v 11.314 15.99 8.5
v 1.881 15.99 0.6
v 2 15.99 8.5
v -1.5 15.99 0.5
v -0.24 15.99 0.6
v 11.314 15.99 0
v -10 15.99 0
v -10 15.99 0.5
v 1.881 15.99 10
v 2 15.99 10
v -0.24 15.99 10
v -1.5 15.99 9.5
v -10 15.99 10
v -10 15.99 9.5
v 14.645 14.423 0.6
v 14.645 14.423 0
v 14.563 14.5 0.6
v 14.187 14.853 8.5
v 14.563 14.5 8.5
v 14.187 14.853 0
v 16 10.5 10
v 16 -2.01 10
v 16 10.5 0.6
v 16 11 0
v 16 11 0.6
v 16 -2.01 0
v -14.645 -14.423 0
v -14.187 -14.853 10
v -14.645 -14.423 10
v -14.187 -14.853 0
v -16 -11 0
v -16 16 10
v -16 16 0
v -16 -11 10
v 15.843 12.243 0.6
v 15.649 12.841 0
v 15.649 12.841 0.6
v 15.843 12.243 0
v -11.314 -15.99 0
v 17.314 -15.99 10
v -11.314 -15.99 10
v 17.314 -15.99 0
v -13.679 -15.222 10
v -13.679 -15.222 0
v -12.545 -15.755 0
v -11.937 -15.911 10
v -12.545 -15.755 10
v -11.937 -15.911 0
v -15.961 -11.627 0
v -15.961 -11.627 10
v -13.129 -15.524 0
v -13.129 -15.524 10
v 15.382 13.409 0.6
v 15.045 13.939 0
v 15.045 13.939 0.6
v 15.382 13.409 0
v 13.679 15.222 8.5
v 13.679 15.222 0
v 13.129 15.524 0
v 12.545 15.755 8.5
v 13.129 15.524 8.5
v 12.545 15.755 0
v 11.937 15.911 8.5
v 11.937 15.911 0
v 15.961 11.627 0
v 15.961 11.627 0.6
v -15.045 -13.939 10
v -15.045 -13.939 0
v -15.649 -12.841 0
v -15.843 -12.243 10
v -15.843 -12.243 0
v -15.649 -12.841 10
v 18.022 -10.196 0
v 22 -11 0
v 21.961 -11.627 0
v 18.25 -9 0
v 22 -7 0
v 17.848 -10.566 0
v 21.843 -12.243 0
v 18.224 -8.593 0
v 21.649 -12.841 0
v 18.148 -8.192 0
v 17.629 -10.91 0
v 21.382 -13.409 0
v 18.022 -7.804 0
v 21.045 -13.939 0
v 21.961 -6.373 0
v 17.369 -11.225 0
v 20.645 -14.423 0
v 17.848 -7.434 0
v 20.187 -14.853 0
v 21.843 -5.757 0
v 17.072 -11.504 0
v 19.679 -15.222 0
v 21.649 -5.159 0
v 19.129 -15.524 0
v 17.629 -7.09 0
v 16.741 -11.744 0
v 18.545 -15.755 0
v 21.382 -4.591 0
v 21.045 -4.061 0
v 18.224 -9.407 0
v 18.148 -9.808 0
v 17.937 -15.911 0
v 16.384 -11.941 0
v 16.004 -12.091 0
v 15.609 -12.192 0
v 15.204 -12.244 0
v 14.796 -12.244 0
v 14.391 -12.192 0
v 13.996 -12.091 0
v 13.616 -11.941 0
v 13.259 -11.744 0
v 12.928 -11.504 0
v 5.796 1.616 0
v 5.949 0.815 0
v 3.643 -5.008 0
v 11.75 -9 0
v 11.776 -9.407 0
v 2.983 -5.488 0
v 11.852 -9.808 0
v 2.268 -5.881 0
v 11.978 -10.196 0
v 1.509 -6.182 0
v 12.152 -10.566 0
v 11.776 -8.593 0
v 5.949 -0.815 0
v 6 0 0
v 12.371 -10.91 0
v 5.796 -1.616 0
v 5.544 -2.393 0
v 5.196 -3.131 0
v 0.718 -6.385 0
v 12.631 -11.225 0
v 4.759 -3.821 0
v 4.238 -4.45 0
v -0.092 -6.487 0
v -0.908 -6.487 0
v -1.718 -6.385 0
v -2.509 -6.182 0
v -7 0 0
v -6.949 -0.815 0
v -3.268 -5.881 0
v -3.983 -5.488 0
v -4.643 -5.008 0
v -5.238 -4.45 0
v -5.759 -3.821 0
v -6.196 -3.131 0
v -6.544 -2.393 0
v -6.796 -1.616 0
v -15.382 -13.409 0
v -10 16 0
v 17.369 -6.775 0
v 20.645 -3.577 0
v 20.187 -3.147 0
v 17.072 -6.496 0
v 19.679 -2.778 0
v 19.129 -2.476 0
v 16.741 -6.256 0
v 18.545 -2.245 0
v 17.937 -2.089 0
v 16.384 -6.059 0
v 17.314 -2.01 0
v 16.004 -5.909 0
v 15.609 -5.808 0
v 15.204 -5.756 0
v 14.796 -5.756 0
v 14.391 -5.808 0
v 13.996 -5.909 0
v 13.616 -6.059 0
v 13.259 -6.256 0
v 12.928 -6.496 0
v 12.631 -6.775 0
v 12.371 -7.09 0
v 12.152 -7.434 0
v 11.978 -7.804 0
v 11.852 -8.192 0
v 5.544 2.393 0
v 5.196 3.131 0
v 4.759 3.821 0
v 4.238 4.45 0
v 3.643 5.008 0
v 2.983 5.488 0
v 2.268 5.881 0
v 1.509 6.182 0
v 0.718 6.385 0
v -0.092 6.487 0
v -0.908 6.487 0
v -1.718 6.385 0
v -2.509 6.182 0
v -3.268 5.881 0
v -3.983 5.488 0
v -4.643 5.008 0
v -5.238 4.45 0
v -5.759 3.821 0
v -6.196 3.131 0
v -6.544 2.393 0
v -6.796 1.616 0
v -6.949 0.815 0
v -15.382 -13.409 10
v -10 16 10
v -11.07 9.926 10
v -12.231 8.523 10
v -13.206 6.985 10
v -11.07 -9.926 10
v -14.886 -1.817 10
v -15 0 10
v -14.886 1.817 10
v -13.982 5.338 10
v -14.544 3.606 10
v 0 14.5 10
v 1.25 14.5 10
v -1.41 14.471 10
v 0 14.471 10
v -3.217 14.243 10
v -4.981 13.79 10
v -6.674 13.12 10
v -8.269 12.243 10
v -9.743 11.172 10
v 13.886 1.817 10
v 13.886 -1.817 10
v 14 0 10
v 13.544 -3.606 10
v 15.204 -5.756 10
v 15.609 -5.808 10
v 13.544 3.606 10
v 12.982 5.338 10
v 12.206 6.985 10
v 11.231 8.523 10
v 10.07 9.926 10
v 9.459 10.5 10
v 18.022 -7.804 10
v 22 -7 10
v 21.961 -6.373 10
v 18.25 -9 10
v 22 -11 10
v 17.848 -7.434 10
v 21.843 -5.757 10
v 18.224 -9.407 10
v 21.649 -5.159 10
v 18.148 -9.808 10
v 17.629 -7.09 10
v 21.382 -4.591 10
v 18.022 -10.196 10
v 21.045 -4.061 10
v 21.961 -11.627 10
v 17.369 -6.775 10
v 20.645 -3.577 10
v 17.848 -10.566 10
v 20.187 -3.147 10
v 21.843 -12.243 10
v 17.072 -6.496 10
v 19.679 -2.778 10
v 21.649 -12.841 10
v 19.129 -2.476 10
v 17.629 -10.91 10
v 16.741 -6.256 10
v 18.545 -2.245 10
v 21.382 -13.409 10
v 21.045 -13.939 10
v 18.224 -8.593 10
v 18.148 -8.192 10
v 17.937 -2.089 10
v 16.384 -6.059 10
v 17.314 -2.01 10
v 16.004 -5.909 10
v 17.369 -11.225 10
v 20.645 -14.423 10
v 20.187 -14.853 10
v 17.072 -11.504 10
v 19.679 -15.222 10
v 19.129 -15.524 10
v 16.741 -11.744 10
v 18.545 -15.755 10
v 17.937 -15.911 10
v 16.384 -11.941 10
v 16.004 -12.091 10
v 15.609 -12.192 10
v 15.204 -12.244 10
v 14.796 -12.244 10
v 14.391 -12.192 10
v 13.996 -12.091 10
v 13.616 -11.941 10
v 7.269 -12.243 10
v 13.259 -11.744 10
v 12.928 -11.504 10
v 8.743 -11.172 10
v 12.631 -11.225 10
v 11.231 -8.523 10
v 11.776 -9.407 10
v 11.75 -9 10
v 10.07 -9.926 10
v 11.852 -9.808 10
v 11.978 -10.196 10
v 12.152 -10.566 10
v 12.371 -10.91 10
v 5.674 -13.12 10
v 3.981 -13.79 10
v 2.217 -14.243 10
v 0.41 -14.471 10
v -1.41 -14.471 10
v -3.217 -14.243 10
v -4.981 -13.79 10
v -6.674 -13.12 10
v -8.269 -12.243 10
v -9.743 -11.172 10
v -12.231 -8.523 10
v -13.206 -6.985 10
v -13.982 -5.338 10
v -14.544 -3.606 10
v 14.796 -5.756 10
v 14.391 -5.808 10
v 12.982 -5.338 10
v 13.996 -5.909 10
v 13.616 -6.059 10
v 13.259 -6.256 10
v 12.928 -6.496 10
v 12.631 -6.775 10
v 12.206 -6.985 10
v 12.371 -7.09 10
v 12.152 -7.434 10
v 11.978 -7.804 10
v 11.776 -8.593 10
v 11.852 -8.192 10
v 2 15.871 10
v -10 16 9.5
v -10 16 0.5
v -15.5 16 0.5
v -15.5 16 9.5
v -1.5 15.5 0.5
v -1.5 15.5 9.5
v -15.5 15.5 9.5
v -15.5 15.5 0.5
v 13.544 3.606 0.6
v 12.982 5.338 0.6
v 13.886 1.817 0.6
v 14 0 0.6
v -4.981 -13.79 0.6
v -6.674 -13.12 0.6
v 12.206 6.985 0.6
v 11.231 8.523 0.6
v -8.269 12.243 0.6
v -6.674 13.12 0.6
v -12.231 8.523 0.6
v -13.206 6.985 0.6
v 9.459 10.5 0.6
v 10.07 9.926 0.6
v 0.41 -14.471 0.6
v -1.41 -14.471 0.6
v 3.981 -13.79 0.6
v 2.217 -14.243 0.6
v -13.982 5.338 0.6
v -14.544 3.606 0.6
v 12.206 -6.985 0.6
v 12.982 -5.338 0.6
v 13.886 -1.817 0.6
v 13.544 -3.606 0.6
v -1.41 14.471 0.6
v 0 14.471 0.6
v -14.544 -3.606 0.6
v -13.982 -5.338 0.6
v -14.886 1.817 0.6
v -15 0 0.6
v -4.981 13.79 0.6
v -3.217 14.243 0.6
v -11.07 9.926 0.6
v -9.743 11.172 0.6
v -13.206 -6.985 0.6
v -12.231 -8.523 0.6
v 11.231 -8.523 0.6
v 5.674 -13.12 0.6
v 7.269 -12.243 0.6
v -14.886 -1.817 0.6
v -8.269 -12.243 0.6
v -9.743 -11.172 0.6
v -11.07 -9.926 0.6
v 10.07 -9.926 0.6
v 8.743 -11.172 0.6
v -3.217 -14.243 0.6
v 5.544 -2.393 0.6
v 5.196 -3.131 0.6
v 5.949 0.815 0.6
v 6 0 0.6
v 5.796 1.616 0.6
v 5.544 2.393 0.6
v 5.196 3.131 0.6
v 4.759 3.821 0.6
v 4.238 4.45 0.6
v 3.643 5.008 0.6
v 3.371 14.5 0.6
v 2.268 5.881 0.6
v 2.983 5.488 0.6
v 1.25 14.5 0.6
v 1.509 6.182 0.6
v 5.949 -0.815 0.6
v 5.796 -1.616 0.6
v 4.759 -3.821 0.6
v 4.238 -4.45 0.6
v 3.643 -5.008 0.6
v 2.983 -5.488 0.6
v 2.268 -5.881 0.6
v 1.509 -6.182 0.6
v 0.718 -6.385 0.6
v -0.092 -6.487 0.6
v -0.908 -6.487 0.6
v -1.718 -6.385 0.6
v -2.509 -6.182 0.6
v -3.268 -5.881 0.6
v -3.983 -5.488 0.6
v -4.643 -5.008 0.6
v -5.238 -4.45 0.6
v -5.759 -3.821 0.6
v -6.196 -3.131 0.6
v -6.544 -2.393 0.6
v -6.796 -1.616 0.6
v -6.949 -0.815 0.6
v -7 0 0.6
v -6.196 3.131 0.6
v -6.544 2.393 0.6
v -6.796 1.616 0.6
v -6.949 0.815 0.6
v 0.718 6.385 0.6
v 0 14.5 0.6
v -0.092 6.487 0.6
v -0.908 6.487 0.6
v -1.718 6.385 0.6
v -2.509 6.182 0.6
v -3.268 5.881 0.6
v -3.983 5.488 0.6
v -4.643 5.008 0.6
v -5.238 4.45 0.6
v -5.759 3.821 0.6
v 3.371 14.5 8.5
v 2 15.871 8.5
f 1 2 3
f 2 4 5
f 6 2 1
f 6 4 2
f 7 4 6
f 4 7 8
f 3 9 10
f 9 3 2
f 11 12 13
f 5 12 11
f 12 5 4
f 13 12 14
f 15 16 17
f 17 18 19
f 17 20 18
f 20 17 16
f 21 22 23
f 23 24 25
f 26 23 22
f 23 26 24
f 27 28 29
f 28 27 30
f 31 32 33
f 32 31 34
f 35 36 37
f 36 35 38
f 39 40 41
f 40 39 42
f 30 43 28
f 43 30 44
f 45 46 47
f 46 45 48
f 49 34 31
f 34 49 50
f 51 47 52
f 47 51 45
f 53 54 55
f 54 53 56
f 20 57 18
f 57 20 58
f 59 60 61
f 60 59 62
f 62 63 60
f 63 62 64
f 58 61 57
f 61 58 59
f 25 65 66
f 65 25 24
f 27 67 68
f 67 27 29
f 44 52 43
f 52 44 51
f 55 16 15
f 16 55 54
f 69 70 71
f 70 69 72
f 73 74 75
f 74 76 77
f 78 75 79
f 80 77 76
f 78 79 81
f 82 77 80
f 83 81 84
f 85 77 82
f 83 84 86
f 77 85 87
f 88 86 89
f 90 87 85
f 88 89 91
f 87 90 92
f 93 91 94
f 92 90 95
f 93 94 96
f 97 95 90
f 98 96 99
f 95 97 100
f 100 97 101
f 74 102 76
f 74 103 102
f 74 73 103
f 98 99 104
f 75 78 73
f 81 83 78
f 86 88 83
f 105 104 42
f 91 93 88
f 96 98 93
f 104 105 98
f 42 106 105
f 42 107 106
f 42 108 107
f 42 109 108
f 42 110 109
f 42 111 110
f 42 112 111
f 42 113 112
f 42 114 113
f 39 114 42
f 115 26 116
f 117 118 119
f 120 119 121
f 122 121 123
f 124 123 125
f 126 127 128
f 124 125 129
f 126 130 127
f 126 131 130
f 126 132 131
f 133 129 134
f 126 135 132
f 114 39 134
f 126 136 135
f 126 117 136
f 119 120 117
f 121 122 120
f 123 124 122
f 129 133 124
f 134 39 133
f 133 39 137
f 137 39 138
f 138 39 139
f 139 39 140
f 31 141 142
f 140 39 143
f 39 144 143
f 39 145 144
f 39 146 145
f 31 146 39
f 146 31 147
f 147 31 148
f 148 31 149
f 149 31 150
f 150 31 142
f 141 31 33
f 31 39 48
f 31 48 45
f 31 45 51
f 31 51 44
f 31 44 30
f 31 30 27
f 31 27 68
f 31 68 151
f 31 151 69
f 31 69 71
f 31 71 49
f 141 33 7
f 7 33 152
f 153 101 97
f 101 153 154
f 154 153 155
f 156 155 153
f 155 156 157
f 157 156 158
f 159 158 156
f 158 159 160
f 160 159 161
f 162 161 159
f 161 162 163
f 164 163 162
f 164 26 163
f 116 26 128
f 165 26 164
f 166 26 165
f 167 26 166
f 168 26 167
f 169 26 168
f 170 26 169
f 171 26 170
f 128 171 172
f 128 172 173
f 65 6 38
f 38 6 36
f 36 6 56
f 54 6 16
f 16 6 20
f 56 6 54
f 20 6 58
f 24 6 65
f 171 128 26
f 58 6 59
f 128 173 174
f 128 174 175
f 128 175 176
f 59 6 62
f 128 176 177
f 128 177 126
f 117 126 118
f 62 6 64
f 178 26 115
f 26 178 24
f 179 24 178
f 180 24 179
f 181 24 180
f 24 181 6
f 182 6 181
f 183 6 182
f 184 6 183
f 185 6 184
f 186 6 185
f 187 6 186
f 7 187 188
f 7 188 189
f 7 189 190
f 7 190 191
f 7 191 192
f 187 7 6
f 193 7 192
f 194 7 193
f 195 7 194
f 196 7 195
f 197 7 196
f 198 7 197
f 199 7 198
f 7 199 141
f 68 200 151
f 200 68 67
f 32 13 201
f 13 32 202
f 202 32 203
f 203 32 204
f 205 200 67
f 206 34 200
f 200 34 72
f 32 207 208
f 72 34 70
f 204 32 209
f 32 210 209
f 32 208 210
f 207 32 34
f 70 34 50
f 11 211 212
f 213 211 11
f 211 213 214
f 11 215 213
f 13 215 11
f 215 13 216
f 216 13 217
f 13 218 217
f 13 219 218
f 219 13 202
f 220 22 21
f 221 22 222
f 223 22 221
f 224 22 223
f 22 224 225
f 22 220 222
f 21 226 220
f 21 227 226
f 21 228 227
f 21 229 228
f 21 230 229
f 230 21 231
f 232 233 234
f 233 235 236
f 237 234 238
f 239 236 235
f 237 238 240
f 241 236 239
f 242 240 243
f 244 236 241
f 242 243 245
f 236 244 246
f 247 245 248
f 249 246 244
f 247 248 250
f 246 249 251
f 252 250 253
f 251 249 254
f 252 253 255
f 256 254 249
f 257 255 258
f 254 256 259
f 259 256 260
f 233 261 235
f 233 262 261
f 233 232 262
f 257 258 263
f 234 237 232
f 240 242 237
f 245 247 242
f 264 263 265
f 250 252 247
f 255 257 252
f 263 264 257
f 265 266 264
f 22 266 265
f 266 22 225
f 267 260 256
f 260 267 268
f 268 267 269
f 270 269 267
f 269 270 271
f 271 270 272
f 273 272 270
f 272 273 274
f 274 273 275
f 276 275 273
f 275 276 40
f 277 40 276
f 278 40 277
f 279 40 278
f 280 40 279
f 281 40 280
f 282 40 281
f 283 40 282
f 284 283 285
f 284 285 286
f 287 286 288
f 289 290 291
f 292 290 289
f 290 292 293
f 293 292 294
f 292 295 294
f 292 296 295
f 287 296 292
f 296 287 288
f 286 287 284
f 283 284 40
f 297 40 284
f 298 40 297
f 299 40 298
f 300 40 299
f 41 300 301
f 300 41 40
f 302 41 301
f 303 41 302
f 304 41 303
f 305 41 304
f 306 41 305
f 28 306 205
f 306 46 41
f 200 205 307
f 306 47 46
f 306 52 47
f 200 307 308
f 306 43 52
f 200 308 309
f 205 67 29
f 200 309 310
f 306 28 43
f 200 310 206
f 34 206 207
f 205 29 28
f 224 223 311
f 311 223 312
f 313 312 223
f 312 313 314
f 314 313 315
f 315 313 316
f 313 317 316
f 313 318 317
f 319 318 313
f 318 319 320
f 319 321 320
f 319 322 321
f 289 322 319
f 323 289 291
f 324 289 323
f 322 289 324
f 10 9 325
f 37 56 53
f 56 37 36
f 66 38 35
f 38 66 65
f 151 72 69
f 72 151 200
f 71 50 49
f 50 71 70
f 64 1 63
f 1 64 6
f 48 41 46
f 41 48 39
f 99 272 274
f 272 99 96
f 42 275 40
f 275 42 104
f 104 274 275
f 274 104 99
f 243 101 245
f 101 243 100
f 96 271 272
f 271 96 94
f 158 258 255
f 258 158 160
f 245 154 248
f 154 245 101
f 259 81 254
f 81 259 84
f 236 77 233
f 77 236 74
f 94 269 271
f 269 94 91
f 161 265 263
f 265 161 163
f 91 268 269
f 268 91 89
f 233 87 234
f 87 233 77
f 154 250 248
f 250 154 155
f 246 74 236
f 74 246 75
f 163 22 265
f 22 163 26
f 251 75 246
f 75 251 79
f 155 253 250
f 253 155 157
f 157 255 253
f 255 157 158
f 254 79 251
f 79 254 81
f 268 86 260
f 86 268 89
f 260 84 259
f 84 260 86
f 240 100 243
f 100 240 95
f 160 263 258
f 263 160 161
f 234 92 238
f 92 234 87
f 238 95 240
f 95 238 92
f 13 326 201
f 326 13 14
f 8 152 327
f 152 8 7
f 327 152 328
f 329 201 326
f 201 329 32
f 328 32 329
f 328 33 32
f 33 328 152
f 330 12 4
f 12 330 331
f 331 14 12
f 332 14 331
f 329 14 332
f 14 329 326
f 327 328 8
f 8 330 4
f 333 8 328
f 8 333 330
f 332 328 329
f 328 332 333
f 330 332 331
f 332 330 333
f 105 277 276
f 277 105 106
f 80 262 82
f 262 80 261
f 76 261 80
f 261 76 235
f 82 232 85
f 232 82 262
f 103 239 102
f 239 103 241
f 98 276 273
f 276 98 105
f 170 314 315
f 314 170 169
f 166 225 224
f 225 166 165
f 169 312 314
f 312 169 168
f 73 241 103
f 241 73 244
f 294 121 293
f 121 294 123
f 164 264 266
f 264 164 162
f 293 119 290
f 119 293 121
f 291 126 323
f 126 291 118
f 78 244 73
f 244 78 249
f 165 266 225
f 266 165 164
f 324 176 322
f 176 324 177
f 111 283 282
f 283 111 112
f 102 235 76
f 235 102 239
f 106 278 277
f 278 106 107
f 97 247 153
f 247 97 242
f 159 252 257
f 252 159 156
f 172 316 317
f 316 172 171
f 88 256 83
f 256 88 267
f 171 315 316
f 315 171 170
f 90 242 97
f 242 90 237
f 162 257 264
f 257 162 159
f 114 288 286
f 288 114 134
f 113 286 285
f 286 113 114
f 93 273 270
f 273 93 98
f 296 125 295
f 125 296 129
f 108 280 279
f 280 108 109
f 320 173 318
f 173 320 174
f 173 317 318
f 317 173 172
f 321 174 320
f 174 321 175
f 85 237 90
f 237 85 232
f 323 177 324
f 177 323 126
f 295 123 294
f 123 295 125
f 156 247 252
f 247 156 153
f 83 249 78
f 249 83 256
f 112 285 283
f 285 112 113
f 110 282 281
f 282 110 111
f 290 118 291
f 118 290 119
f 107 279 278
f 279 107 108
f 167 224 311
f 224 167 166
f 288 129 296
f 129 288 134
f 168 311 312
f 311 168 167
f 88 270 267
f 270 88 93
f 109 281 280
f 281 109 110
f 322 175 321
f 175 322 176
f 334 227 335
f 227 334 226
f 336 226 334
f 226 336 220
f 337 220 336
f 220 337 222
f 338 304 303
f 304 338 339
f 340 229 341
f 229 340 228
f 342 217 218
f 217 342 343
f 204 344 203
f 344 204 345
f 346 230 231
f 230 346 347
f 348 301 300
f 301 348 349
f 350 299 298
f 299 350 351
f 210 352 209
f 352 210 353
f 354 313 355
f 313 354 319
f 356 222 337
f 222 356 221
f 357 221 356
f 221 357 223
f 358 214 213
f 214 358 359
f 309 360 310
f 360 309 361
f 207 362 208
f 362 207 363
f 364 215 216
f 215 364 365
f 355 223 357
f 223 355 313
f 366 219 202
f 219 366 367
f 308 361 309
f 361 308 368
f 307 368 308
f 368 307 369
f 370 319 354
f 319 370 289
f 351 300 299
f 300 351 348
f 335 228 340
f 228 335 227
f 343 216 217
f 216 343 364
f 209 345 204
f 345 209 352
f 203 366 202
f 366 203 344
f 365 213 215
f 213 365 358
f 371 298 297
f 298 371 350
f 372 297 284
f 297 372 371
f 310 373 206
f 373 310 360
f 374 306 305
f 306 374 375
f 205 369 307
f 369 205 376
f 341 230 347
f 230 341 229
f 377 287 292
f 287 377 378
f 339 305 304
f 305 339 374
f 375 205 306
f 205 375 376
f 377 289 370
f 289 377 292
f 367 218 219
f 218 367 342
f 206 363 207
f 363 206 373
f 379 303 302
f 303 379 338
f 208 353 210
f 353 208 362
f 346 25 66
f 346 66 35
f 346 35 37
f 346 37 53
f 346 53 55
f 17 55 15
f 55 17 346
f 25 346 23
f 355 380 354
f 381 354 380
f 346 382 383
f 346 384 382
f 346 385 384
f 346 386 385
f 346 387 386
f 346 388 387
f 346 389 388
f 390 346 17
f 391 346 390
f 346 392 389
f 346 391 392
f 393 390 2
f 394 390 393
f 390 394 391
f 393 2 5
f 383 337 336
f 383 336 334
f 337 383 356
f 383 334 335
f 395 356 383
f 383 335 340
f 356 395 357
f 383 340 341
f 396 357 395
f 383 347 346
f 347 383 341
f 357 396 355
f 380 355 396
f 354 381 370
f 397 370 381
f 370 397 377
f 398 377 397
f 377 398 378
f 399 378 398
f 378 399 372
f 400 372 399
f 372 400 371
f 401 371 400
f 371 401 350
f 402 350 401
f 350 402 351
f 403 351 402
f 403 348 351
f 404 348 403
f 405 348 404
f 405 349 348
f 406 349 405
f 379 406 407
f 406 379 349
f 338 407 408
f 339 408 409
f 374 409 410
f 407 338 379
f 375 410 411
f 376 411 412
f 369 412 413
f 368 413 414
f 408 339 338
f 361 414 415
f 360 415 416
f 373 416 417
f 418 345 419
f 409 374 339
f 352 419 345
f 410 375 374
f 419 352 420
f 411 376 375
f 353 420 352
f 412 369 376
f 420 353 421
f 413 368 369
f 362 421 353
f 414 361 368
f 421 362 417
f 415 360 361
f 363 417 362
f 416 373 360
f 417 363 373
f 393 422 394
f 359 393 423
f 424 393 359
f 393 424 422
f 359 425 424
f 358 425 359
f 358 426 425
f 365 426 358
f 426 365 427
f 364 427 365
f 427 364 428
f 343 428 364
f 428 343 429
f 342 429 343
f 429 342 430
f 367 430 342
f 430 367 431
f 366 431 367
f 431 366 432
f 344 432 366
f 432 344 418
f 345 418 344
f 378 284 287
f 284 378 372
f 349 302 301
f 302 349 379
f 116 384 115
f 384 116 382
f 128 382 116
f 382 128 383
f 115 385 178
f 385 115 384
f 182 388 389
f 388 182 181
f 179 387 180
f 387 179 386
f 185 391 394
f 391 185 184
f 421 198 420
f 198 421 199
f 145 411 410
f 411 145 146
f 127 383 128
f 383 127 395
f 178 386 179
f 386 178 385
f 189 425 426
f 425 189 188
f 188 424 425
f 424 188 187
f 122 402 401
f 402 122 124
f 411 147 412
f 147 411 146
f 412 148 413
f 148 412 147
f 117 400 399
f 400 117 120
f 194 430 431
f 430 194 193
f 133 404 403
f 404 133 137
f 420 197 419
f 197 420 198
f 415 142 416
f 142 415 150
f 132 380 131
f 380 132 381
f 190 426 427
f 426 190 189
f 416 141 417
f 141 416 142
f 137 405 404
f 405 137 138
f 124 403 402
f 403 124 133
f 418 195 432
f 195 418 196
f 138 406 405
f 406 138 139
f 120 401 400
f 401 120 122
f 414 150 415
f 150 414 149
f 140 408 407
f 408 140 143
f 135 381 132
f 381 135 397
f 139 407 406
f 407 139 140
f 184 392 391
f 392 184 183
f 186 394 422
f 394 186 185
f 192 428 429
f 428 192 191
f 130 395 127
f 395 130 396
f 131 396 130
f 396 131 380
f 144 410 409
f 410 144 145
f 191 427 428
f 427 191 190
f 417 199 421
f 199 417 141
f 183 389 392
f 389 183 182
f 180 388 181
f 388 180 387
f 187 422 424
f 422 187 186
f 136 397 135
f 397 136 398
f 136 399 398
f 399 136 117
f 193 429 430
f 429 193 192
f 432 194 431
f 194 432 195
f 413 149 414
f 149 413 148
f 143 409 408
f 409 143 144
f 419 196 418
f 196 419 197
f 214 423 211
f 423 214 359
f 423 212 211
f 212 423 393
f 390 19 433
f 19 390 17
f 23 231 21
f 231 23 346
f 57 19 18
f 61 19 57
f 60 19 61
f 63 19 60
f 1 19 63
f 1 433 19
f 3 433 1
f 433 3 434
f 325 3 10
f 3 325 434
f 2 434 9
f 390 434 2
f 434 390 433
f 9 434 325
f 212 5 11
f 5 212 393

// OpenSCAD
$fn = 50;


difference() {
	union() {
		hull() {
			translate(v = [-11.0000000000, 11.0000000000, 0]) {
				cylinder(h = 10, r = 5);
			}
			translate(v = [11.0000000000, 11.0000000000, 0]) {
				cylinder(h = 10, r = 5);
			}
			translate(v = [-11.0000000000, -11.0000000000, 0]) {
				cylinder(h = 10, r = 5);
			}
			translate(v = [11.0000000000, -11.0000000000, 0]) {
				cylinder(h = 10, r = 5);
			}
		}
		translate(v = [7.5000000000, -9.0000000000, 0]) {
			hull() {
				translate(v = [-9.5000000000, 2.0000000000, 0]) {
					cylinder(h = 10, r = 5);
				}
				translate(v = [9.5000000000, 2.0000000000, 0]) {
					cylinder(h = 10, r = 5);
				}
				translate(v = [-9.5000000000, -2.0000000000, 0]) {
					cylinder(h = 10, r = 5);
				}
				translate(v = [9.5000000000, -2.0000000000, 0]) {
					cylinder(h = 10, r = 5);
				}
			}
		}
		translate(v = [-16.0000000000, 10.0000000000, 0]) {
			cube(size = [6, 6, 10]);
		}
	}
	union() {
		translate(v = [-15.5000000000, 15.5000000000, 0.5000000000]) {
			cube(size = [14, 0.5000000000, 9.0000000000]);
		}
		translate(v = [15.0000000000, -9.0000000000, -50.0000000000]) {
			cylinder(h = 100, r = 3.2500000000);
		}
		translate(v = [-0.5000000000, 0.0000000000, 0.6000000000]) {
			cylinder(h = 12.4000000000, r = 14.5000000000);
		}
		translate(v = [-0.5000000000, 0.0000000000, -5.0000000000]) {
			cylinder(h = 10, r = 6.5000000000);
		}
		translate(v = [0.0000000000, 10.5000000000, 0.6000000000]) {
			cube(size = [16.0000000000, 4, 12.4000000000]);
		}
		translate(v = [2.0000000000, 10.5000000000, 8.5000000000]) {
			cube(size = [14.0000000000, 7, 1.5000000000]);
		}
		translate(v = [-3.0000000000, 18.7500000000, 0.6000000000]) {
			rotate(a = [0, 0, -45]) {
				cube(size = [10, 1.5000000000, 12.4000000000]);
			}
		}
		translate(v = [2.2500000000, 11.0000000000, 0.6000000000]) {
			cube(size = [7.5000000000, 2, 9.4000000000]);
		}
	}
}
